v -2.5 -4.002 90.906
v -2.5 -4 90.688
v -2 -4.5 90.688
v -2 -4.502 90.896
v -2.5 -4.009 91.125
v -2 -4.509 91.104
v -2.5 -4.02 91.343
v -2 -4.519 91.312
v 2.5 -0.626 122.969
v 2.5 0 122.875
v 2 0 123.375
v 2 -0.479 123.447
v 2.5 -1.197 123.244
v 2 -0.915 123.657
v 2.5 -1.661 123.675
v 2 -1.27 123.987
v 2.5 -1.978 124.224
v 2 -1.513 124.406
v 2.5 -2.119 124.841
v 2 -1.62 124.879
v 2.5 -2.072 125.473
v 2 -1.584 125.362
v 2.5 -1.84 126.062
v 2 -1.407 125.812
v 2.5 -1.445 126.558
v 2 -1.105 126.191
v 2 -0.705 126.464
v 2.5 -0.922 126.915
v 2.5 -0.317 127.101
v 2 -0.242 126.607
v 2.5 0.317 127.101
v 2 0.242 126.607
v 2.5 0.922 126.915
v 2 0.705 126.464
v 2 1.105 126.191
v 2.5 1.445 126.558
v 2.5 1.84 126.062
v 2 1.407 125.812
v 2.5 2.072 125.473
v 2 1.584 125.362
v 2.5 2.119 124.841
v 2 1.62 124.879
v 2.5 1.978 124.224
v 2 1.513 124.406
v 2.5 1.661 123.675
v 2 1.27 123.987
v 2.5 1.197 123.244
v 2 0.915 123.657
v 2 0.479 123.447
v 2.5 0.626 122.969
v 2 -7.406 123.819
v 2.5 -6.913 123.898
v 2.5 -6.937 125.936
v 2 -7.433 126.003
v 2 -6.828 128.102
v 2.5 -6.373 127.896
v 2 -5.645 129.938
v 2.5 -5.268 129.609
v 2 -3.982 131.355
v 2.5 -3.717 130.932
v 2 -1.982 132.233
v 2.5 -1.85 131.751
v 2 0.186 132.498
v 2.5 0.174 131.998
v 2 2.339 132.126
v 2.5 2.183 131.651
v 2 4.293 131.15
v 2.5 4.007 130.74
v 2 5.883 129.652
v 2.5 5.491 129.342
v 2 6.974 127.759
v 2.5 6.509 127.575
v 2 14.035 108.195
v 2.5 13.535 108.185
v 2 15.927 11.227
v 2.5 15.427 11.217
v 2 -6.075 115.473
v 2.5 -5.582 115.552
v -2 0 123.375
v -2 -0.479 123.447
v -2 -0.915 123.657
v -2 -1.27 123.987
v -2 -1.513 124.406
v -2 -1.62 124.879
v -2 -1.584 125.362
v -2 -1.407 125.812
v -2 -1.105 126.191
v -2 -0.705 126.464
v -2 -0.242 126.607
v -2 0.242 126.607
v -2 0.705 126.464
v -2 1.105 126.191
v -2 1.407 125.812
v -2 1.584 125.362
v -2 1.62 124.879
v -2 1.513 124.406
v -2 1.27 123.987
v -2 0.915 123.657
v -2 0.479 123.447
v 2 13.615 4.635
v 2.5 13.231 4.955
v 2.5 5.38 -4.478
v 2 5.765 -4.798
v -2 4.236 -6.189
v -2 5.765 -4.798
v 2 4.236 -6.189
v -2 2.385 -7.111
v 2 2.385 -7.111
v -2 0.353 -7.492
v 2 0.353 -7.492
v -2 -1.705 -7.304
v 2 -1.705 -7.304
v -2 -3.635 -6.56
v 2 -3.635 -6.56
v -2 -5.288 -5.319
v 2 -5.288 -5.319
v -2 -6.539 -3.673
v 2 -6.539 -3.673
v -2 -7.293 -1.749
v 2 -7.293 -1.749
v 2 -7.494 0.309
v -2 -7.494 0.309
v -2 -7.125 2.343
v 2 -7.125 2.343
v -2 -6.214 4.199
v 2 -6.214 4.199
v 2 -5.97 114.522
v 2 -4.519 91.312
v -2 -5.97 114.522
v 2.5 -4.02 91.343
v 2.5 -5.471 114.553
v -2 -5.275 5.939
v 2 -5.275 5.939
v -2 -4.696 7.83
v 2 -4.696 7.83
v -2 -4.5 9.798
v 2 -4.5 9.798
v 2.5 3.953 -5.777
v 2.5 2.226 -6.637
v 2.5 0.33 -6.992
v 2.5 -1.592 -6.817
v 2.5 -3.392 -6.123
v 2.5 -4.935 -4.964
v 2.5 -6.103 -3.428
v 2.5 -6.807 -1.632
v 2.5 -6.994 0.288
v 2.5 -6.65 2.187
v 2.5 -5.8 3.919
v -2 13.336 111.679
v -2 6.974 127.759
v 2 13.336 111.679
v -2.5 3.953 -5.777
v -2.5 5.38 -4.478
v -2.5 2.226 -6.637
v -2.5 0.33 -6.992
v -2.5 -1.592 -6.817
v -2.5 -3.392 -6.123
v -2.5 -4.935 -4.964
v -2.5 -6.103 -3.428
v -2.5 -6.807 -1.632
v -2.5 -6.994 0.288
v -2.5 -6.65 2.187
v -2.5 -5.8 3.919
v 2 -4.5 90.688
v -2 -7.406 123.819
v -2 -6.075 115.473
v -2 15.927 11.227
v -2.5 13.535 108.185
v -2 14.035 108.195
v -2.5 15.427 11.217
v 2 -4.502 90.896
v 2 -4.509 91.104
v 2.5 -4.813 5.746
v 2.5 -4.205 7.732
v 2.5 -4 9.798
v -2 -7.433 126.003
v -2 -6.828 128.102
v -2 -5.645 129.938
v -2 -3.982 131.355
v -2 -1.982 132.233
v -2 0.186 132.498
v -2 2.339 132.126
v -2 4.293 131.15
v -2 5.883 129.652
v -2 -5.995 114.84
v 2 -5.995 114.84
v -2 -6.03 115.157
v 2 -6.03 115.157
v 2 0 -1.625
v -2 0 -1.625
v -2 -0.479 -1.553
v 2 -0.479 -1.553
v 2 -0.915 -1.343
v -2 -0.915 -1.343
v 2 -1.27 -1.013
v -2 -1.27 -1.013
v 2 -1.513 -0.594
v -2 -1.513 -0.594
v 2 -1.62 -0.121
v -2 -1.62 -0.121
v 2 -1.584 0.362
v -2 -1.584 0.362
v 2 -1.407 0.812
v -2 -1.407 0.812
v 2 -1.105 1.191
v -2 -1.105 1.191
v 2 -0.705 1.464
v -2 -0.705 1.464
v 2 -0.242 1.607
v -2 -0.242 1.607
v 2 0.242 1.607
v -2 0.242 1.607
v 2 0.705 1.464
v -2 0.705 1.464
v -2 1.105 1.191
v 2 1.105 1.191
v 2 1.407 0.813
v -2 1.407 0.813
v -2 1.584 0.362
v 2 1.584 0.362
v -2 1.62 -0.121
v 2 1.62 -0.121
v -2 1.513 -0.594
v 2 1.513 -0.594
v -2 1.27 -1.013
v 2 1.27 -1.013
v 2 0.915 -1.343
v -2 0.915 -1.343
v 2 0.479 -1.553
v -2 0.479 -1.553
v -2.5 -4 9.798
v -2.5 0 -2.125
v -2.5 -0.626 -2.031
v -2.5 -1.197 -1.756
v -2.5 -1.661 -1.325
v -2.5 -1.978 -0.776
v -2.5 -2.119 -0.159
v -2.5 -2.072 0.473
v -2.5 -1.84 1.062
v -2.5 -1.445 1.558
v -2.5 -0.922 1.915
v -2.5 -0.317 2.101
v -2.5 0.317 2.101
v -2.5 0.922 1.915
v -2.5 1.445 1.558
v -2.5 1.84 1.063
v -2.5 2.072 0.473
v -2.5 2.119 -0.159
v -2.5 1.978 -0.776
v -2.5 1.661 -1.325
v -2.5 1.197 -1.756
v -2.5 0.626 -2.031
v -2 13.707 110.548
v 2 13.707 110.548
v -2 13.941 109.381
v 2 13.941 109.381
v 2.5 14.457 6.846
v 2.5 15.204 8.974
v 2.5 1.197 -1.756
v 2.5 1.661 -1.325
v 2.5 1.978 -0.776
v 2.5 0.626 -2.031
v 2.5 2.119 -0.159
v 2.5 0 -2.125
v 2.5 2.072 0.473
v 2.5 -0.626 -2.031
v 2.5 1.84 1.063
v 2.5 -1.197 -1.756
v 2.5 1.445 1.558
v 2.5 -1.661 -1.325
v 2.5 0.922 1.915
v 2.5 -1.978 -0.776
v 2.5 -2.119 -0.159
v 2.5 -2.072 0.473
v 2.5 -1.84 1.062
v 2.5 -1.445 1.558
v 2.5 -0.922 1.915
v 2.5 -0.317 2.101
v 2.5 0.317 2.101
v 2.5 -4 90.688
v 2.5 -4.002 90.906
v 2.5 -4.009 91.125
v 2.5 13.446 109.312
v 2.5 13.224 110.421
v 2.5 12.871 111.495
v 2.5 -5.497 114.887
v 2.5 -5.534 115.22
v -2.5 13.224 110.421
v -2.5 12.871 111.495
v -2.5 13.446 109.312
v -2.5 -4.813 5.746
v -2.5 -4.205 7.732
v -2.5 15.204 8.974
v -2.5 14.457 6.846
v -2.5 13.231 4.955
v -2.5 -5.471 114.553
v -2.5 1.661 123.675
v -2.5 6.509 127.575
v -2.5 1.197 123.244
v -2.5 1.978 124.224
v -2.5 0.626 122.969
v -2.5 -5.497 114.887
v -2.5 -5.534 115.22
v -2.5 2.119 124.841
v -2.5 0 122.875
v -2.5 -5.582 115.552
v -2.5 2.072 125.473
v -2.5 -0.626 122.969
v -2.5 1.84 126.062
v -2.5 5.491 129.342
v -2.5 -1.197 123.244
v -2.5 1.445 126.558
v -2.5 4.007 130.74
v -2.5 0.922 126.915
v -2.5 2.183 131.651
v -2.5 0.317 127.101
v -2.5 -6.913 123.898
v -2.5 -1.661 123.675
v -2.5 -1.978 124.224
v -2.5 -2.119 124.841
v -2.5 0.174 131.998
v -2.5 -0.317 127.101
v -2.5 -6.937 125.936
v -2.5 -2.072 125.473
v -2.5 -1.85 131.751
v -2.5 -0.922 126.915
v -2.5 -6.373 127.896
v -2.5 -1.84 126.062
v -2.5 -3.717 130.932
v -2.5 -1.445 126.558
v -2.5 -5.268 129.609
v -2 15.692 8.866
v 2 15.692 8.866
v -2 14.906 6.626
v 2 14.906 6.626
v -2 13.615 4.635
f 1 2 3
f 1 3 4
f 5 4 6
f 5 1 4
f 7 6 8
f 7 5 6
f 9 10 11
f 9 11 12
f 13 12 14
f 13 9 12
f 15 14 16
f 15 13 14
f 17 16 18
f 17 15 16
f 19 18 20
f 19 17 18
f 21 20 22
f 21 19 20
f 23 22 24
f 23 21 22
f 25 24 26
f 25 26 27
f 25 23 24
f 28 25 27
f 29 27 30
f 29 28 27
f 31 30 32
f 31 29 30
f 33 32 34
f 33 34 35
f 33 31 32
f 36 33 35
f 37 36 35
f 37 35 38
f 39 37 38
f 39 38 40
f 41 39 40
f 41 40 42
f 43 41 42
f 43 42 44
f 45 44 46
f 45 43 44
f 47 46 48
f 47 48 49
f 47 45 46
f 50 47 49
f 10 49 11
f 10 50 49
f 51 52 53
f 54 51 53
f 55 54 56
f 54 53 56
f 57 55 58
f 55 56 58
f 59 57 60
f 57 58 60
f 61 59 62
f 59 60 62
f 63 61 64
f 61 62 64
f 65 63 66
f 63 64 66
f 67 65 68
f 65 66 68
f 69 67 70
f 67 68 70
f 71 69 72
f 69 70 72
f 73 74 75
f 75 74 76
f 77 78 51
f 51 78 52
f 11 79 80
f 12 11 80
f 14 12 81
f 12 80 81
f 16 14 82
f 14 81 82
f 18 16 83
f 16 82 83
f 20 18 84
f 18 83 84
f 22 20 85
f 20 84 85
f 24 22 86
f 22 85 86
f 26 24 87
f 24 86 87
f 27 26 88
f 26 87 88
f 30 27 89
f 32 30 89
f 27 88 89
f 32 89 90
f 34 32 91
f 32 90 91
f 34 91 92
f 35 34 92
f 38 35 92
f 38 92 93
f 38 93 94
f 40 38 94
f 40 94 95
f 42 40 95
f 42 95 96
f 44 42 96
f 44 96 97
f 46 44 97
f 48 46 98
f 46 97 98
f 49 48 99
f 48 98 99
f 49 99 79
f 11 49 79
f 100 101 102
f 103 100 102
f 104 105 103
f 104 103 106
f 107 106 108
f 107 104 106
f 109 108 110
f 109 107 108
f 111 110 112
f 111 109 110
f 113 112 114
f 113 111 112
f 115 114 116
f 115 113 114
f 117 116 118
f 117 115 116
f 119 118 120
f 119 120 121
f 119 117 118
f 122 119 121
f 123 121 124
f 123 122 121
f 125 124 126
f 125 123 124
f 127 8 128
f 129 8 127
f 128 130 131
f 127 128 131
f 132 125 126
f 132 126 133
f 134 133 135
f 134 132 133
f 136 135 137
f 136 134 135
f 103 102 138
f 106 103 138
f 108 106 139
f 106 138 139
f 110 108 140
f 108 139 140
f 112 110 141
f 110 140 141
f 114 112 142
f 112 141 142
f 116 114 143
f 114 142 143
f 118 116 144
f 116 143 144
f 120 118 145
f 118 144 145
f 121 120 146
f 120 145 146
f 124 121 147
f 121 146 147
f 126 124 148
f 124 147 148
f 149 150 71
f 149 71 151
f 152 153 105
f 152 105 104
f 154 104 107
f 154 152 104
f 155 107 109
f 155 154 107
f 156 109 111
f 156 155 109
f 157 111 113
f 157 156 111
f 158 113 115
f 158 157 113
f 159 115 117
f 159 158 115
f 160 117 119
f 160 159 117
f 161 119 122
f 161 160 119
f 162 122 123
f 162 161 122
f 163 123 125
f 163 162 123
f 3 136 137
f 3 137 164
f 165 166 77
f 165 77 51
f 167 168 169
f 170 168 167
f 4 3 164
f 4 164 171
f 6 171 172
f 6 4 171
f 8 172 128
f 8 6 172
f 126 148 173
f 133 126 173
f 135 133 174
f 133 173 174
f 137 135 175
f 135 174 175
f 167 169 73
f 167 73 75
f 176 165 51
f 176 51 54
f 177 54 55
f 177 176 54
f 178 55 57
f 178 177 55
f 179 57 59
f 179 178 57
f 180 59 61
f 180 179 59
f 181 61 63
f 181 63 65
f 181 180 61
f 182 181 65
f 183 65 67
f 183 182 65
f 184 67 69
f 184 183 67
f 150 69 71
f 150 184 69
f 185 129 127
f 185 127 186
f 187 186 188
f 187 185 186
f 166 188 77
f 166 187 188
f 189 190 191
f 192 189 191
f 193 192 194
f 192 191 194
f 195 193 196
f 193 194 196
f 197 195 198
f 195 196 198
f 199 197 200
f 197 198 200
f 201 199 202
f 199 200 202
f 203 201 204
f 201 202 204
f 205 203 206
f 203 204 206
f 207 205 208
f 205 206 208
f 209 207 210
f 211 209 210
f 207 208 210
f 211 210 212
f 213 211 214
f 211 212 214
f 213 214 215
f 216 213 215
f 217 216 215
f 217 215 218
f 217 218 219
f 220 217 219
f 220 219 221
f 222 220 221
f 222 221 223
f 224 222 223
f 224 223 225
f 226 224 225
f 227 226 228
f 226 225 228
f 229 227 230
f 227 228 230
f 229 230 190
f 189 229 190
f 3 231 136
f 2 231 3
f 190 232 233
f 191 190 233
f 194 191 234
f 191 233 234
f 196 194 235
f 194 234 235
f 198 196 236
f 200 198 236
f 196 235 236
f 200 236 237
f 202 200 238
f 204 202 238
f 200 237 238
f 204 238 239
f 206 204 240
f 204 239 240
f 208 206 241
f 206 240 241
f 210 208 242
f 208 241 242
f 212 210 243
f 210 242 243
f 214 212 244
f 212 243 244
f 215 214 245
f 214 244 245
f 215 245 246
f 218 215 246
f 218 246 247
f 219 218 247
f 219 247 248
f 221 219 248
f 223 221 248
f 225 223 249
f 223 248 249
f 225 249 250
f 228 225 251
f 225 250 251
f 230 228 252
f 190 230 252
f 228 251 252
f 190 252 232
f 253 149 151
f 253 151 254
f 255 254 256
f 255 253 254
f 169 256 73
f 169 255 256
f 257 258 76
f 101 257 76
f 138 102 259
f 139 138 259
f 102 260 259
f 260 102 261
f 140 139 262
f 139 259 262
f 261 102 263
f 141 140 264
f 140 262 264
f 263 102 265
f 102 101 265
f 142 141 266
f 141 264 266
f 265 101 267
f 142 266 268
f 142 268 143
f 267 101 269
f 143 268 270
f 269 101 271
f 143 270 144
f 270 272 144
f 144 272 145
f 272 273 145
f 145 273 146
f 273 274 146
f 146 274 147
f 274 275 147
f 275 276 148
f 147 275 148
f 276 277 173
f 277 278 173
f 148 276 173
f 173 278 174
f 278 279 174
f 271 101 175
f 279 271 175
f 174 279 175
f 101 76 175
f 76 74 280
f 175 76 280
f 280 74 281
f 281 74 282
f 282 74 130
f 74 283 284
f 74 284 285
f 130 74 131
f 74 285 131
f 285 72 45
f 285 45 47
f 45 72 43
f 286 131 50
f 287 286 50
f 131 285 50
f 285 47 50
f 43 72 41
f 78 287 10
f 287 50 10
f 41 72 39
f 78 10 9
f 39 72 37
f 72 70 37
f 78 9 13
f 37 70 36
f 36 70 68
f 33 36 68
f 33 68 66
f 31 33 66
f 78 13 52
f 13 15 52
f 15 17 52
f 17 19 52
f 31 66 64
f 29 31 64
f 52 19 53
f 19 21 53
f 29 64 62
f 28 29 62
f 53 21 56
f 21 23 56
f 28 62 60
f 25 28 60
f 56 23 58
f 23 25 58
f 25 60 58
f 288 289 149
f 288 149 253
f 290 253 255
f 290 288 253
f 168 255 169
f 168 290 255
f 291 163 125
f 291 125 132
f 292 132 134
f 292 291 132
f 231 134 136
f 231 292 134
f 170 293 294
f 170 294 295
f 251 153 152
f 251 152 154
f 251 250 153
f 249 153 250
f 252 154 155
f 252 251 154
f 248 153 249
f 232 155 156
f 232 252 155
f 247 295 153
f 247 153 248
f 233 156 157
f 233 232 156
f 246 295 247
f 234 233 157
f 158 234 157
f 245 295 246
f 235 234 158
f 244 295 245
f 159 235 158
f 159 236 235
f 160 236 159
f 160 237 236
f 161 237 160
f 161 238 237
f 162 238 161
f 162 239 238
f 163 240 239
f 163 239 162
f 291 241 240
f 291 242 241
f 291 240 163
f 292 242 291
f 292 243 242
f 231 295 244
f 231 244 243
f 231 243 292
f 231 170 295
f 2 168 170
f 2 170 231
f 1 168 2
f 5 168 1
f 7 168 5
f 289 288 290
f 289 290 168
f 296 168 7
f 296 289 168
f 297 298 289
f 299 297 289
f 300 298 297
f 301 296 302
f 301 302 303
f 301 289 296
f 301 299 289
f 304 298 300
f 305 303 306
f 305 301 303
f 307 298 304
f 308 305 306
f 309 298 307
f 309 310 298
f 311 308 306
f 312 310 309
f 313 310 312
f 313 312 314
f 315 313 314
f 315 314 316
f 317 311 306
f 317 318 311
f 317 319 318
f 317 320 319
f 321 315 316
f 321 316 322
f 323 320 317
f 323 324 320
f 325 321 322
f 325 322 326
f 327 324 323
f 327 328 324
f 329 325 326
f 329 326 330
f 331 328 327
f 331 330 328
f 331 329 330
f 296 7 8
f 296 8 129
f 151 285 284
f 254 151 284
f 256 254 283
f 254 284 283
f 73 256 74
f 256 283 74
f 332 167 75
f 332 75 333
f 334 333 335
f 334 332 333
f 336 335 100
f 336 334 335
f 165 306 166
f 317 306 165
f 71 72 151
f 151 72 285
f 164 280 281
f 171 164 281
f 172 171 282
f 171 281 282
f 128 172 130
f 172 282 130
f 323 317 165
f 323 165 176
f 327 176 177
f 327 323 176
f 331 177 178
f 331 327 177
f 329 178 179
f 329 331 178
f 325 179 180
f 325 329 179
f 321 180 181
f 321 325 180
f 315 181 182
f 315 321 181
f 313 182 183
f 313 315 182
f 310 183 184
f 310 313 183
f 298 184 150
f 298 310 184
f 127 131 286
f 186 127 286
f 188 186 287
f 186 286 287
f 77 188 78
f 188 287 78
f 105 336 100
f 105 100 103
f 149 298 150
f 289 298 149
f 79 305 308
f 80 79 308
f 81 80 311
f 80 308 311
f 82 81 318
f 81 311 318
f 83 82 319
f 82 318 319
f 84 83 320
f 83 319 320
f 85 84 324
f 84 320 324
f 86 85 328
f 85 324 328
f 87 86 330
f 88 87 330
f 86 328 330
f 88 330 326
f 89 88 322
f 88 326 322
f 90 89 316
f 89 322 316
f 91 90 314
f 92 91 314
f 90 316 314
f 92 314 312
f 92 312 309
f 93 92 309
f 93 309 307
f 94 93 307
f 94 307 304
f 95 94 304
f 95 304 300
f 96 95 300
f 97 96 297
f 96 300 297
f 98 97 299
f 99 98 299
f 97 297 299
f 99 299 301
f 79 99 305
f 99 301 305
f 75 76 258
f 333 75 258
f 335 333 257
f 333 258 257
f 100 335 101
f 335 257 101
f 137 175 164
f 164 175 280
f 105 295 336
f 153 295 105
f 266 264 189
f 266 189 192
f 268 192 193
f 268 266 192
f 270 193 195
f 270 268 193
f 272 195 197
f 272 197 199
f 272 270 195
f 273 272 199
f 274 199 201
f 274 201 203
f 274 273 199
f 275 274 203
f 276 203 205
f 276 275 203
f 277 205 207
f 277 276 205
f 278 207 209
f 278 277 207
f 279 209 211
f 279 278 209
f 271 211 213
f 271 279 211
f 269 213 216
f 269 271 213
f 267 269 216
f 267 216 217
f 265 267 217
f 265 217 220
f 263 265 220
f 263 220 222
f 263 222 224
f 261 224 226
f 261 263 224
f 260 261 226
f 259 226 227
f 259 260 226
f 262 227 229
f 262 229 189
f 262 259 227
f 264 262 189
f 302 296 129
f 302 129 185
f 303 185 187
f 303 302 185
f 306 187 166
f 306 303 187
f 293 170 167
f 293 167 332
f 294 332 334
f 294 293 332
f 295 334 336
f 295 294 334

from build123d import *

# Parameters (mm, degrees)
SKETCH_1_R      = 1.625
SKETCH_1_R_2    = 1.575
EXTRUDE_1_DEPTH = 5
CHAMFER_1_SIZE  = 0.5
EXTRUDE_2_DEPTH = 5
EXTRUDE_3_DEPTH = 5


with BuildPart() as part:
    # 草图1 → 凸台-拉伸1 (new body)
    with BuildSketch(Plane(origin=(-2.5, 0, 0), x_dir=(0, -1, 0), z_dir=(-1, 0, 0))):
        with BuildLine():
            Line((-13.615329727, 4.634814191), (-5.764611689, -4.797838271))
            ThreePointArc((-5.764611689, -4.797838271), (4.504097017, -5.996925051), (6.214285714, 4.199125273))
            ThreePointArc((6.214285714, 4.199125273), (4.938171125, 6.870258752), (4.5, 9.797958971))
            Line((4.5, 9.797958971), (4.5, 90.687804581))
            ThreePointArc((4.5, 90.687804581), (4.50486974, 90.999847969), (4.519474215, 91.311587443))
            Line((4.519474215, 91.311587443), (5.970120756, 114.521932102))
            ThreePointArc((5.970120756, 114.521932102), (6.011395859, 114.998738119), (6.075436578, 115.473023263))
            Line((6.075436578, 115.473023263), (7.406407472, 123.818844483))
            ThreePointArc((7.406407472, 123.818844483), (1.981957648, 132.233383985), (-6.974045822, 127.759109434))
            Line((-6.974045822, 127.759109434), (-13.335850238, 111.678734019))
            ThreePointArc((-13.335850238, 111.678734019), (-13.841506721, 109.968181983), (-14.03521939, 108.195006258))
            Line((-14.03521939, 108.195006258), (-15.927277723, 11.227016703))
            ThreePointArc((-15.927277723, 11.227016703), (-15.365674922, 7.722463826), (-13.615329727, 4.634814191))
        make_face()
        with Locations(Location((0, 125, 0), (0, 0, 270))):
            Circle(SKETCH_1_R, mode=Mode.SUBTRACT)
        with Locations(Location((-8.5, 23.5, 0), (0, 0, 270))):
            Circle(SKETCH_1_R_2, mode=Mode.SUBTRACT)
        with Locations(Location((-5, 106.5, 0), (0, 0, 270))):
            Circle(SKETCH_1_R_2, mode=Mode.SUBTRACT)
        with Locations(Location((0, 0, 0), (0, 0, 270))):
            Circle(SKETCH_1_R, mode=Mode.SUBTRACT)
        with BuildLine():
            Line((-8.259933132, 32.545201991), (-6.991881816, 97.532831936))
            ThreePointArc((-6.991881816, 97.532831936), (-4.95324547, 99.493434355), (-2.992643051, 97.454798009))
            Line((-2.992643051, 97.454798009), (-4.260694367, 32.467168064))
            ThreePointArc((-4.260694367, 32.467168064), (-6.299330713, 30.506565645), (-8.259933132, 32.545201991))
        make_face(mode=Mode.SUBTRACT)
    extrude(amount=-EXTRUDE_1_DEPTH)

    # 倒角1
    chamfer_1_edges = [part.edges().sort_by_distance(p)[0] for p in [
        (2.5, -4.504097017, -5.996925051),
        (-2.5, 14.981248556, 59.71101148),
        (-2.5, 13.841506721, 109.968181983),
        (-2.5, 10.15494803, 119.718921727),
        (-2.5, -1.981957648, 132.233383985),
        (-2.5, -6.740922025, 119.645933873),
        (-2.5, -6.011395859, 114.998738119),
        (-2.5, -5.244797486, 102.916759772),
        (-2.5, -4.50486974, 90.999847969),
        (-2.5, -4.5, 50.242881776),
        (-2.5, -4.938171125, 6.870258752),
        (2.5, -4.938171125, 6.870258752),
        (-2.5, -4.504097017, -5.996925051),
        (-2.5, 9.689970708, -0.08151204),
        (-2.5, 15.365674922, 7.722463826),
        (2.5, -4.5, 50.242881776),
        (2.5, -4.50486974, 90.999847969),
        (2.5, -5.244797486, 102.916759772),
        (2.5, -6.011395859, 114.998738119),
        (2.5, 0, 126.625),
        (-2.5, 0, 126.625),
        (2.5, -6.740922025, 119.645933873),
        (2.5, 8.5, 25.075),
        (-2.5, 8.5, 25.075),
        (2.5, -1.981957648, 132.233383985),
        (2.5, 6.299330713, 30.506565645),
        (2.5, 7.625907474, 65.039016964),
        (2.5, 4.95324547, 99.493434355),
        (2.5, 3.626668709, 64.960983036),
        (2.5, 10.15494803, 119.718921727),
        (-2.5, 6.299330713, 30.506565645),
        (-2.5, 3.626668709, 64.960983036),
        (-2.5, 4.95324547, 99.493434355),
        (-2.5, 7.625907474, 65.039016964),
        (2.5, 13.841506721, 109.968181983),
        (2.5, 15.365674922, 7.722463826),
        (2.5, 14.981248556, 59.71101148),
        (2.5, 5, 108.075),
        (-2.5, 5, 108.075),
        (2.5, 0, 1.625),
        (-2.5, 0, 1.625),
        (2.5, 9.689970708, -0.08151204),
    ]]
    chamfer(chamfer_1_edges, length=CHAMFER_1_SIZE)

    # Sketch 3D_1 → 凸台-拉伸2 (add)
    with BuildSketch(Plane(origin=(2.5, -0.12857826, 115.032359126), x_dir=(0, -0.013604097539647628, -0.9999074599832386), z_dir=(1, 0, 0))):
        Polygon((0, 0), (96.922582011, 1.318666289), (96.940522936, 0), (0.017940925, -1.318666289), align=None)
    extrude(amount=-EXTRUDE_2_DEPTH)

    # Sketch 3D_2 → 凸台-拉伸3 (add)
    with BuildSketch(Plane(origin=(2.5, 7.131907218, 114.778535538), x_dir=(0, -0.036322969616865465, -0.9993401032072177), z_dir=(1, 0, 0))):
        Polygon((0, 0), (17.760330703, 3.73858914), (75.88295175, 7.788553229), (95.2811606, 9.140213698), (100.246342151, 0), (71.295283996, -6.76874803), (5.48633166, -7.137591509), align=None)
    extrude(amount=-EXTRUDE_3_DEPTH)


solid = part.part
